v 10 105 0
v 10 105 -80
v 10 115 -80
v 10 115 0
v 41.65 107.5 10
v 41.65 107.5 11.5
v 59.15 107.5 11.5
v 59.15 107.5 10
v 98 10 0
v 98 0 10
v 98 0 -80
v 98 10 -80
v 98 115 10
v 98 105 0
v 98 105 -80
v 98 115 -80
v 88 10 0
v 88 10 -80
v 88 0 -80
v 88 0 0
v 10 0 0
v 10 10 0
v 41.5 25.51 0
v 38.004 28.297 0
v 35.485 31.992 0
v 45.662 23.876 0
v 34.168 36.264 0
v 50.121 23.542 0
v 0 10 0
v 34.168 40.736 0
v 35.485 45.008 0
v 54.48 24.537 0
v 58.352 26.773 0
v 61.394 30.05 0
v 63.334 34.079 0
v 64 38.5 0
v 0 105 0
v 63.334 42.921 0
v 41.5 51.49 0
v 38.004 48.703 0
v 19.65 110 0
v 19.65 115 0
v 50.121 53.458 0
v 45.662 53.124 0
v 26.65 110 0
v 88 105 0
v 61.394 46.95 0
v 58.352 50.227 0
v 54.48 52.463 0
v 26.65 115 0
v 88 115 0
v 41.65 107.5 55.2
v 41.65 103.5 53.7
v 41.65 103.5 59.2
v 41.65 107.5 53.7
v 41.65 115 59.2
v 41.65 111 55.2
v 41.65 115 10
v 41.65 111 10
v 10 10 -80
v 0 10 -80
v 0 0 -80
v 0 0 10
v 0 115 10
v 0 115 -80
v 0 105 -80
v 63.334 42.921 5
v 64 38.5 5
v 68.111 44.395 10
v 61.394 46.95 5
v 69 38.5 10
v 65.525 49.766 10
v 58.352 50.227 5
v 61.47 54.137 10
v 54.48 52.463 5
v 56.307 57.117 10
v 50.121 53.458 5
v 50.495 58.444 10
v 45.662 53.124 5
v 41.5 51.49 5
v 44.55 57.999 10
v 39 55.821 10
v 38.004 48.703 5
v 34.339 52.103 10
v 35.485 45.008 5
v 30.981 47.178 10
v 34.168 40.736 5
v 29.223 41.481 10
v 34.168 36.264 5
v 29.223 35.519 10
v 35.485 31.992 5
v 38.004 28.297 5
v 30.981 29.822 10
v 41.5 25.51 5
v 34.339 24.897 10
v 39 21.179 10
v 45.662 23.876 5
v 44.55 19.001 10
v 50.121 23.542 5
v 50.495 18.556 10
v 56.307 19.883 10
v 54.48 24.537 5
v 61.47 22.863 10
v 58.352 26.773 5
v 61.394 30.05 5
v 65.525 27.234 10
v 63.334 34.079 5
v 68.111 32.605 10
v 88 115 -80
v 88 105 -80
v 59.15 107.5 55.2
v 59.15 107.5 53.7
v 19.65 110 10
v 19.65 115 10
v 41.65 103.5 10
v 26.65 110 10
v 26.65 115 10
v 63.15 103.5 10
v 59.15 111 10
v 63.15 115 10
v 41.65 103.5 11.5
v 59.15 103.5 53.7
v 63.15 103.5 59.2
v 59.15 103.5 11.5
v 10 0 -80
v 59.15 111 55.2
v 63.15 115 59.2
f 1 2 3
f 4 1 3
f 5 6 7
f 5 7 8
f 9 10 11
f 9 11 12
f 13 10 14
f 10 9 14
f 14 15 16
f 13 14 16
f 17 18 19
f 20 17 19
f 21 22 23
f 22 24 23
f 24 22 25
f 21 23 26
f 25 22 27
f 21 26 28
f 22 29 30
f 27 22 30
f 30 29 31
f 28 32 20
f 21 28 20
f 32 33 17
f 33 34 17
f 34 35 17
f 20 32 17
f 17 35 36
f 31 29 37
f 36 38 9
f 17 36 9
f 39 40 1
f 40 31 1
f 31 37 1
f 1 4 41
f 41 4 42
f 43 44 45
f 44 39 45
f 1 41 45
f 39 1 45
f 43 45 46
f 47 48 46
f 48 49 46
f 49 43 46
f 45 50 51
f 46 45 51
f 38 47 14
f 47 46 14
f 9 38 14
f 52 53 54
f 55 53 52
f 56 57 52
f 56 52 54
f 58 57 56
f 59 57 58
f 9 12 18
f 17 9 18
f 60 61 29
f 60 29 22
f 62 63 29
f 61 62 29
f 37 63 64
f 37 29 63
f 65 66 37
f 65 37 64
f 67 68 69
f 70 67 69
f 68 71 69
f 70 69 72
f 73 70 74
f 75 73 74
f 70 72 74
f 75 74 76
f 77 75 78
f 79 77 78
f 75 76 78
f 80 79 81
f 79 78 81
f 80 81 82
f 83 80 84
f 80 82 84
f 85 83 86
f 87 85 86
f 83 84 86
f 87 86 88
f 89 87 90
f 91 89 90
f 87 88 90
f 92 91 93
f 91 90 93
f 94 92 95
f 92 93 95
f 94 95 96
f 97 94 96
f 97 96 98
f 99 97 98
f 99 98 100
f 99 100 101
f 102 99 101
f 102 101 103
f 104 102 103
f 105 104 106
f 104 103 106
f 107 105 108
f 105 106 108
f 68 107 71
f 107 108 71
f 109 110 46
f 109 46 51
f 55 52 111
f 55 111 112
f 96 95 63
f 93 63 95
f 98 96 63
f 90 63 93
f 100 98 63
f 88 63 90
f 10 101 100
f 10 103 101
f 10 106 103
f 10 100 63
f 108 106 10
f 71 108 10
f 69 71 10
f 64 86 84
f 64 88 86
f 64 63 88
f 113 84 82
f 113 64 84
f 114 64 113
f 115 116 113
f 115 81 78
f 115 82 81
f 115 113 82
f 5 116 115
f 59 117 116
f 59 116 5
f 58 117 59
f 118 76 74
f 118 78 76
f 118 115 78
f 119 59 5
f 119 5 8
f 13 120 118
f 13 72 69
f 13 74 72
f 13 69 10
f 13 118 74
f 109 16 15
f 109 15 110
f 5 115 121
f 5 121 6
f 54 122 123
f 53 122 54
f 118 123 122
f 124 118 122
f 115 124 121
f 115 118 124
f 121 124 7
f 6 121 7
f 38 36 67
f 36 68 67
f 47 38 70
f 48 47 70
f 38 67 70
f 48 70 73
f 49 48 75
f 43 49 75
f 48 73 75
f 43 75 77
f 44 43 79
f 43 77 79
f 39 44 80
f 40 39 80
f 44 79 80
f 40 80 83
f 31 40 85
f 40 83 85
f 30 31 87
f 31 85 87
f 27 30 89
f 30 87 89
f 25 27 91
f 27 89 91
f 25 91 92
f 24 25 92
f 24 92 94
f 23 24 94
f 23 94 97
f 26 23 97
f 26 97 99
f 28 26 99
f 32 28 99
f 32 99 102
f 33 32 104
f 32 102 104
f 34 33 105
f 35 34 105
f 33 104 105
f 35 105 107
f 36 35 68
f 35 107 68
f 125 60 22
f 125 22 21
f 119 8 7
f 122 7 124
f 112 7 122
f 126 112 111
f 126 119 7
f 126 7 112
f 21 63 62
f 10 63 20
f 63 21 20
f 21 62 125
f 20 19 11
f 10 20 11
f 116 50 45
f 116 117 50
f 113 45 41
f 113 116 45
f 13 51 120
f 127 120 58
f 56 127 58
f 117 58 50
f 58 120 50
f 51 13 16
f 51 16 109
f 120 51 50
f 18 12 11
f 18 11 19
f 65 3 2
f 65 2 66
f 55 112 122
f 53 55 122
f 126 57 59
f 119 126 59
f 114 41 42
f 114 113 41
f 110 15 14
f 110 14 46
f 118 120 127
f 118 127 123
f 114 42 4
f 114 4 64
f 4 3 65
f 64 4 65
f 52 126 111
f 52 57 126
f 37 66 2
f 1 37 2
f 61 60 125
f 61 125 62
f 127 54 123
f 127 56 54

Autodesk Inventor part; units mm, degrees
ref_plane "YZ Plane" through (0, 0, 0) normal (1, 0, 0) x (0, 1, 0)
ref_plane "XZ Plane" through (0, 0, 0) normal (0, 1, 0) x (-1, 0, 0)
ref_plane "XY Plane" through (0, 0, 0) normal (0, 0, 1) x (1, 0, 0)
sketch "Skizze1" plane through (0, 0, 0) normal (0, 0, 1) x (1, 0, 0)
  line L0 (-19.6, 0) -> (117.6, 0) projected
  line L1 (0, -23) -> (0, 138) projected
  line L2 (0, 0) -> (98, 0)
  line L3 (98, 0) -> (98, 115)
  line L4 (98, 115) -> (0, 115)
  line L5 (0, 115) -> (0, 0)
  point P0 (0, 115)
  dimension "d0" = 115
  dimension "d1" = 98
extrude "Extrusion1" add sketch "Skizze1" along normal blind 10
sketch "Skizze2" plane through (0, 0, 10) normal (0, 0, 1) x (1, 0, 0)
  line L0 (98, 115) -> (0, 115) projected
  line L1 (41.65, 115) -> (63.15, 115)
  line L2 (63.15, 115) -> (63.15, 103.5)
  line L3 (63.15, 103.5) -> (41.65, 103.5)
  line L4 (41.65, 103.5) -> (41.65, 115)
  line L5 (98, 0) -> (98, 115) projected
  point P0 (0, 0)
  dimension "d4" = 21.5
  dimension "d5" = 11.5
  dimension "d6" = 34.85
extrude "Extrusion2" add sketch "Skizze2" along normal blind 49.2
sketch "Skizze3" plane through (41.65, 103.5, 10) normal (-1, 0, 0) x (0, 0, 1)
  line L0 (45.2, 7.5) -> (45.2, 4)
  line L1 (45.2, 4) -> (43.7, 4)
  line L2 (43.7, 4) -> (43.7, 2.8888)
  line L3 (0, 0) -> (0, 11.5) projected
  line L4 (45.2, 7.5) -> (0, 7.5)
  line L5 (0, 11.5) -> (0, 0) projected
  line L6 (0, 4) -> (0, 7.5)
  line L7 (49.2, 11.5) -> (49.2, 0) projected
  line L8 (0, 11.5) -> (49.2, 11.5) projected
  line L9 (0, 0) -> (49.2, 0) projected
  line L10 (1.5, 2.8888) -> (1.5, 4)
  line L11 (1.5, 4) -> (0, 4)
  line L12 (43.7, 2.8888) -> (43.7, 0)
  line L13 (1.5, 2.8888) -> (1.5, 0)
  point P0 (-10, -103.5)
  point P1 (0, 4)
  dimension "d9" = 4
  dimension "d10" = 4
  dimension "d11" = 4
  dimension "d12" = 4
  dimension "d13" = 1.5
  dimension "d14" = 1.5
extrude "Extrusion3" cut sketch "Skizze3" against normal blind 17.5 contours L0 L1 L2 L12 L9 L13 L10 L11 L3 L4
sketch "Skizze4" plane through (0, 0, 10) normal (0, 0, 1) x (1, 0, 0)
  line L0 (98, 115) -> (0, 115) projected
  line L1 (19.65, 115) -> (26.65, 115)
  line L2 (26.65, 115) -> (26.65, 110)
  line L3 (26.65, 110) -> (19.65, 110)
  line L4 (19.65, 110) -> (19.65, 115)
  line L5 (41.65, 115) -> (41.65, 103.5) projected
  point P0 (0, 0)
  dimension "d17" = 7
  dimension "d18" = 5
  dimension "d19" = 15
extrude "Extrusion4" cut sketch "Skizze4" against normal blind 10
sketch "Skizze5" plane through (0, 0, 0) normal (0, 0, -1) x (-1, 0, 0)
  line L0 (-19.65, 115) -> (0, 115) projected
  line L1 (0, 115) -> (0, 0) projected
  line L2 (-10, 115) -> (0, 115)
  line L3 (0, 115) -> (0, 105)
  line L4 (0, 105) -> (-10, 105)
  line L5 (-10, 105) -> (-10, 115)
  line L6 (0, 0) -> (-98, 0) projected
  line L7 (0, 10) -> (-10, 10)
  line L8 (-10, 10) -> (-10, 0)
  line L9 (-10, 0) -> (0, 0)
  line L10 (0, 0) -> (0, 10)
  line L11 (-98, 10) -> (-88, 10)
  line L12 (-88, 10) -> (-88, 0)
  line L13 (-88, 0) -> (-98, 0)
  line L14 (-98, 0) -> (-98, 10)
  line L15 (-98, 115) -> (-26.65, 115) projected
  line L16 (-88, 115) -> (-98, 115)
  line L17 (-98, 115) -> (-98, 105)
  line L18 (-98, 105) -> (-88, 105)
  line L19 (-88, 105) -> (-88, 115)
  line L20 (-98, 0) -> (-98, 115) projected
  point P0 (-98, 0)
  point P1 (-88, 0)
  dimension "d22" = 10
  dimension "d23" = 10
  dimension "d24" = 10
  dimension "d25" = 10
  dimension "d26" = 10
  dimension "d27" = 10
  dimension "d28" = 10
  dimension "d29" = 10
  dimension "d40" = 0
extrude "Extrusion5" add sketch "Skizze5" along normal blind 80
sketch "Skizze6" plane through (0, 0, 10) normal (0, 0, 1) x (1, 0, 0)
  circle A0 centre (49, 38.5) radius 15
  line L0 (0, 115) -> (0, 0) projected
  line L1 (41.65, 103.5) -> (63.15, 103.5) projected
  dimension "d32" = 30
  dimension "d33" = 49
  dimension "d34" = 65
extrude "Extrusion6" cut sketch "Skizze6" against normal blind 10
chamfer "Fase1" distance 5 angle 45 1 edges at (34, 38.5, 10)
properties part number "Senso_Halter" material "Acetalharz, Schwarz"
